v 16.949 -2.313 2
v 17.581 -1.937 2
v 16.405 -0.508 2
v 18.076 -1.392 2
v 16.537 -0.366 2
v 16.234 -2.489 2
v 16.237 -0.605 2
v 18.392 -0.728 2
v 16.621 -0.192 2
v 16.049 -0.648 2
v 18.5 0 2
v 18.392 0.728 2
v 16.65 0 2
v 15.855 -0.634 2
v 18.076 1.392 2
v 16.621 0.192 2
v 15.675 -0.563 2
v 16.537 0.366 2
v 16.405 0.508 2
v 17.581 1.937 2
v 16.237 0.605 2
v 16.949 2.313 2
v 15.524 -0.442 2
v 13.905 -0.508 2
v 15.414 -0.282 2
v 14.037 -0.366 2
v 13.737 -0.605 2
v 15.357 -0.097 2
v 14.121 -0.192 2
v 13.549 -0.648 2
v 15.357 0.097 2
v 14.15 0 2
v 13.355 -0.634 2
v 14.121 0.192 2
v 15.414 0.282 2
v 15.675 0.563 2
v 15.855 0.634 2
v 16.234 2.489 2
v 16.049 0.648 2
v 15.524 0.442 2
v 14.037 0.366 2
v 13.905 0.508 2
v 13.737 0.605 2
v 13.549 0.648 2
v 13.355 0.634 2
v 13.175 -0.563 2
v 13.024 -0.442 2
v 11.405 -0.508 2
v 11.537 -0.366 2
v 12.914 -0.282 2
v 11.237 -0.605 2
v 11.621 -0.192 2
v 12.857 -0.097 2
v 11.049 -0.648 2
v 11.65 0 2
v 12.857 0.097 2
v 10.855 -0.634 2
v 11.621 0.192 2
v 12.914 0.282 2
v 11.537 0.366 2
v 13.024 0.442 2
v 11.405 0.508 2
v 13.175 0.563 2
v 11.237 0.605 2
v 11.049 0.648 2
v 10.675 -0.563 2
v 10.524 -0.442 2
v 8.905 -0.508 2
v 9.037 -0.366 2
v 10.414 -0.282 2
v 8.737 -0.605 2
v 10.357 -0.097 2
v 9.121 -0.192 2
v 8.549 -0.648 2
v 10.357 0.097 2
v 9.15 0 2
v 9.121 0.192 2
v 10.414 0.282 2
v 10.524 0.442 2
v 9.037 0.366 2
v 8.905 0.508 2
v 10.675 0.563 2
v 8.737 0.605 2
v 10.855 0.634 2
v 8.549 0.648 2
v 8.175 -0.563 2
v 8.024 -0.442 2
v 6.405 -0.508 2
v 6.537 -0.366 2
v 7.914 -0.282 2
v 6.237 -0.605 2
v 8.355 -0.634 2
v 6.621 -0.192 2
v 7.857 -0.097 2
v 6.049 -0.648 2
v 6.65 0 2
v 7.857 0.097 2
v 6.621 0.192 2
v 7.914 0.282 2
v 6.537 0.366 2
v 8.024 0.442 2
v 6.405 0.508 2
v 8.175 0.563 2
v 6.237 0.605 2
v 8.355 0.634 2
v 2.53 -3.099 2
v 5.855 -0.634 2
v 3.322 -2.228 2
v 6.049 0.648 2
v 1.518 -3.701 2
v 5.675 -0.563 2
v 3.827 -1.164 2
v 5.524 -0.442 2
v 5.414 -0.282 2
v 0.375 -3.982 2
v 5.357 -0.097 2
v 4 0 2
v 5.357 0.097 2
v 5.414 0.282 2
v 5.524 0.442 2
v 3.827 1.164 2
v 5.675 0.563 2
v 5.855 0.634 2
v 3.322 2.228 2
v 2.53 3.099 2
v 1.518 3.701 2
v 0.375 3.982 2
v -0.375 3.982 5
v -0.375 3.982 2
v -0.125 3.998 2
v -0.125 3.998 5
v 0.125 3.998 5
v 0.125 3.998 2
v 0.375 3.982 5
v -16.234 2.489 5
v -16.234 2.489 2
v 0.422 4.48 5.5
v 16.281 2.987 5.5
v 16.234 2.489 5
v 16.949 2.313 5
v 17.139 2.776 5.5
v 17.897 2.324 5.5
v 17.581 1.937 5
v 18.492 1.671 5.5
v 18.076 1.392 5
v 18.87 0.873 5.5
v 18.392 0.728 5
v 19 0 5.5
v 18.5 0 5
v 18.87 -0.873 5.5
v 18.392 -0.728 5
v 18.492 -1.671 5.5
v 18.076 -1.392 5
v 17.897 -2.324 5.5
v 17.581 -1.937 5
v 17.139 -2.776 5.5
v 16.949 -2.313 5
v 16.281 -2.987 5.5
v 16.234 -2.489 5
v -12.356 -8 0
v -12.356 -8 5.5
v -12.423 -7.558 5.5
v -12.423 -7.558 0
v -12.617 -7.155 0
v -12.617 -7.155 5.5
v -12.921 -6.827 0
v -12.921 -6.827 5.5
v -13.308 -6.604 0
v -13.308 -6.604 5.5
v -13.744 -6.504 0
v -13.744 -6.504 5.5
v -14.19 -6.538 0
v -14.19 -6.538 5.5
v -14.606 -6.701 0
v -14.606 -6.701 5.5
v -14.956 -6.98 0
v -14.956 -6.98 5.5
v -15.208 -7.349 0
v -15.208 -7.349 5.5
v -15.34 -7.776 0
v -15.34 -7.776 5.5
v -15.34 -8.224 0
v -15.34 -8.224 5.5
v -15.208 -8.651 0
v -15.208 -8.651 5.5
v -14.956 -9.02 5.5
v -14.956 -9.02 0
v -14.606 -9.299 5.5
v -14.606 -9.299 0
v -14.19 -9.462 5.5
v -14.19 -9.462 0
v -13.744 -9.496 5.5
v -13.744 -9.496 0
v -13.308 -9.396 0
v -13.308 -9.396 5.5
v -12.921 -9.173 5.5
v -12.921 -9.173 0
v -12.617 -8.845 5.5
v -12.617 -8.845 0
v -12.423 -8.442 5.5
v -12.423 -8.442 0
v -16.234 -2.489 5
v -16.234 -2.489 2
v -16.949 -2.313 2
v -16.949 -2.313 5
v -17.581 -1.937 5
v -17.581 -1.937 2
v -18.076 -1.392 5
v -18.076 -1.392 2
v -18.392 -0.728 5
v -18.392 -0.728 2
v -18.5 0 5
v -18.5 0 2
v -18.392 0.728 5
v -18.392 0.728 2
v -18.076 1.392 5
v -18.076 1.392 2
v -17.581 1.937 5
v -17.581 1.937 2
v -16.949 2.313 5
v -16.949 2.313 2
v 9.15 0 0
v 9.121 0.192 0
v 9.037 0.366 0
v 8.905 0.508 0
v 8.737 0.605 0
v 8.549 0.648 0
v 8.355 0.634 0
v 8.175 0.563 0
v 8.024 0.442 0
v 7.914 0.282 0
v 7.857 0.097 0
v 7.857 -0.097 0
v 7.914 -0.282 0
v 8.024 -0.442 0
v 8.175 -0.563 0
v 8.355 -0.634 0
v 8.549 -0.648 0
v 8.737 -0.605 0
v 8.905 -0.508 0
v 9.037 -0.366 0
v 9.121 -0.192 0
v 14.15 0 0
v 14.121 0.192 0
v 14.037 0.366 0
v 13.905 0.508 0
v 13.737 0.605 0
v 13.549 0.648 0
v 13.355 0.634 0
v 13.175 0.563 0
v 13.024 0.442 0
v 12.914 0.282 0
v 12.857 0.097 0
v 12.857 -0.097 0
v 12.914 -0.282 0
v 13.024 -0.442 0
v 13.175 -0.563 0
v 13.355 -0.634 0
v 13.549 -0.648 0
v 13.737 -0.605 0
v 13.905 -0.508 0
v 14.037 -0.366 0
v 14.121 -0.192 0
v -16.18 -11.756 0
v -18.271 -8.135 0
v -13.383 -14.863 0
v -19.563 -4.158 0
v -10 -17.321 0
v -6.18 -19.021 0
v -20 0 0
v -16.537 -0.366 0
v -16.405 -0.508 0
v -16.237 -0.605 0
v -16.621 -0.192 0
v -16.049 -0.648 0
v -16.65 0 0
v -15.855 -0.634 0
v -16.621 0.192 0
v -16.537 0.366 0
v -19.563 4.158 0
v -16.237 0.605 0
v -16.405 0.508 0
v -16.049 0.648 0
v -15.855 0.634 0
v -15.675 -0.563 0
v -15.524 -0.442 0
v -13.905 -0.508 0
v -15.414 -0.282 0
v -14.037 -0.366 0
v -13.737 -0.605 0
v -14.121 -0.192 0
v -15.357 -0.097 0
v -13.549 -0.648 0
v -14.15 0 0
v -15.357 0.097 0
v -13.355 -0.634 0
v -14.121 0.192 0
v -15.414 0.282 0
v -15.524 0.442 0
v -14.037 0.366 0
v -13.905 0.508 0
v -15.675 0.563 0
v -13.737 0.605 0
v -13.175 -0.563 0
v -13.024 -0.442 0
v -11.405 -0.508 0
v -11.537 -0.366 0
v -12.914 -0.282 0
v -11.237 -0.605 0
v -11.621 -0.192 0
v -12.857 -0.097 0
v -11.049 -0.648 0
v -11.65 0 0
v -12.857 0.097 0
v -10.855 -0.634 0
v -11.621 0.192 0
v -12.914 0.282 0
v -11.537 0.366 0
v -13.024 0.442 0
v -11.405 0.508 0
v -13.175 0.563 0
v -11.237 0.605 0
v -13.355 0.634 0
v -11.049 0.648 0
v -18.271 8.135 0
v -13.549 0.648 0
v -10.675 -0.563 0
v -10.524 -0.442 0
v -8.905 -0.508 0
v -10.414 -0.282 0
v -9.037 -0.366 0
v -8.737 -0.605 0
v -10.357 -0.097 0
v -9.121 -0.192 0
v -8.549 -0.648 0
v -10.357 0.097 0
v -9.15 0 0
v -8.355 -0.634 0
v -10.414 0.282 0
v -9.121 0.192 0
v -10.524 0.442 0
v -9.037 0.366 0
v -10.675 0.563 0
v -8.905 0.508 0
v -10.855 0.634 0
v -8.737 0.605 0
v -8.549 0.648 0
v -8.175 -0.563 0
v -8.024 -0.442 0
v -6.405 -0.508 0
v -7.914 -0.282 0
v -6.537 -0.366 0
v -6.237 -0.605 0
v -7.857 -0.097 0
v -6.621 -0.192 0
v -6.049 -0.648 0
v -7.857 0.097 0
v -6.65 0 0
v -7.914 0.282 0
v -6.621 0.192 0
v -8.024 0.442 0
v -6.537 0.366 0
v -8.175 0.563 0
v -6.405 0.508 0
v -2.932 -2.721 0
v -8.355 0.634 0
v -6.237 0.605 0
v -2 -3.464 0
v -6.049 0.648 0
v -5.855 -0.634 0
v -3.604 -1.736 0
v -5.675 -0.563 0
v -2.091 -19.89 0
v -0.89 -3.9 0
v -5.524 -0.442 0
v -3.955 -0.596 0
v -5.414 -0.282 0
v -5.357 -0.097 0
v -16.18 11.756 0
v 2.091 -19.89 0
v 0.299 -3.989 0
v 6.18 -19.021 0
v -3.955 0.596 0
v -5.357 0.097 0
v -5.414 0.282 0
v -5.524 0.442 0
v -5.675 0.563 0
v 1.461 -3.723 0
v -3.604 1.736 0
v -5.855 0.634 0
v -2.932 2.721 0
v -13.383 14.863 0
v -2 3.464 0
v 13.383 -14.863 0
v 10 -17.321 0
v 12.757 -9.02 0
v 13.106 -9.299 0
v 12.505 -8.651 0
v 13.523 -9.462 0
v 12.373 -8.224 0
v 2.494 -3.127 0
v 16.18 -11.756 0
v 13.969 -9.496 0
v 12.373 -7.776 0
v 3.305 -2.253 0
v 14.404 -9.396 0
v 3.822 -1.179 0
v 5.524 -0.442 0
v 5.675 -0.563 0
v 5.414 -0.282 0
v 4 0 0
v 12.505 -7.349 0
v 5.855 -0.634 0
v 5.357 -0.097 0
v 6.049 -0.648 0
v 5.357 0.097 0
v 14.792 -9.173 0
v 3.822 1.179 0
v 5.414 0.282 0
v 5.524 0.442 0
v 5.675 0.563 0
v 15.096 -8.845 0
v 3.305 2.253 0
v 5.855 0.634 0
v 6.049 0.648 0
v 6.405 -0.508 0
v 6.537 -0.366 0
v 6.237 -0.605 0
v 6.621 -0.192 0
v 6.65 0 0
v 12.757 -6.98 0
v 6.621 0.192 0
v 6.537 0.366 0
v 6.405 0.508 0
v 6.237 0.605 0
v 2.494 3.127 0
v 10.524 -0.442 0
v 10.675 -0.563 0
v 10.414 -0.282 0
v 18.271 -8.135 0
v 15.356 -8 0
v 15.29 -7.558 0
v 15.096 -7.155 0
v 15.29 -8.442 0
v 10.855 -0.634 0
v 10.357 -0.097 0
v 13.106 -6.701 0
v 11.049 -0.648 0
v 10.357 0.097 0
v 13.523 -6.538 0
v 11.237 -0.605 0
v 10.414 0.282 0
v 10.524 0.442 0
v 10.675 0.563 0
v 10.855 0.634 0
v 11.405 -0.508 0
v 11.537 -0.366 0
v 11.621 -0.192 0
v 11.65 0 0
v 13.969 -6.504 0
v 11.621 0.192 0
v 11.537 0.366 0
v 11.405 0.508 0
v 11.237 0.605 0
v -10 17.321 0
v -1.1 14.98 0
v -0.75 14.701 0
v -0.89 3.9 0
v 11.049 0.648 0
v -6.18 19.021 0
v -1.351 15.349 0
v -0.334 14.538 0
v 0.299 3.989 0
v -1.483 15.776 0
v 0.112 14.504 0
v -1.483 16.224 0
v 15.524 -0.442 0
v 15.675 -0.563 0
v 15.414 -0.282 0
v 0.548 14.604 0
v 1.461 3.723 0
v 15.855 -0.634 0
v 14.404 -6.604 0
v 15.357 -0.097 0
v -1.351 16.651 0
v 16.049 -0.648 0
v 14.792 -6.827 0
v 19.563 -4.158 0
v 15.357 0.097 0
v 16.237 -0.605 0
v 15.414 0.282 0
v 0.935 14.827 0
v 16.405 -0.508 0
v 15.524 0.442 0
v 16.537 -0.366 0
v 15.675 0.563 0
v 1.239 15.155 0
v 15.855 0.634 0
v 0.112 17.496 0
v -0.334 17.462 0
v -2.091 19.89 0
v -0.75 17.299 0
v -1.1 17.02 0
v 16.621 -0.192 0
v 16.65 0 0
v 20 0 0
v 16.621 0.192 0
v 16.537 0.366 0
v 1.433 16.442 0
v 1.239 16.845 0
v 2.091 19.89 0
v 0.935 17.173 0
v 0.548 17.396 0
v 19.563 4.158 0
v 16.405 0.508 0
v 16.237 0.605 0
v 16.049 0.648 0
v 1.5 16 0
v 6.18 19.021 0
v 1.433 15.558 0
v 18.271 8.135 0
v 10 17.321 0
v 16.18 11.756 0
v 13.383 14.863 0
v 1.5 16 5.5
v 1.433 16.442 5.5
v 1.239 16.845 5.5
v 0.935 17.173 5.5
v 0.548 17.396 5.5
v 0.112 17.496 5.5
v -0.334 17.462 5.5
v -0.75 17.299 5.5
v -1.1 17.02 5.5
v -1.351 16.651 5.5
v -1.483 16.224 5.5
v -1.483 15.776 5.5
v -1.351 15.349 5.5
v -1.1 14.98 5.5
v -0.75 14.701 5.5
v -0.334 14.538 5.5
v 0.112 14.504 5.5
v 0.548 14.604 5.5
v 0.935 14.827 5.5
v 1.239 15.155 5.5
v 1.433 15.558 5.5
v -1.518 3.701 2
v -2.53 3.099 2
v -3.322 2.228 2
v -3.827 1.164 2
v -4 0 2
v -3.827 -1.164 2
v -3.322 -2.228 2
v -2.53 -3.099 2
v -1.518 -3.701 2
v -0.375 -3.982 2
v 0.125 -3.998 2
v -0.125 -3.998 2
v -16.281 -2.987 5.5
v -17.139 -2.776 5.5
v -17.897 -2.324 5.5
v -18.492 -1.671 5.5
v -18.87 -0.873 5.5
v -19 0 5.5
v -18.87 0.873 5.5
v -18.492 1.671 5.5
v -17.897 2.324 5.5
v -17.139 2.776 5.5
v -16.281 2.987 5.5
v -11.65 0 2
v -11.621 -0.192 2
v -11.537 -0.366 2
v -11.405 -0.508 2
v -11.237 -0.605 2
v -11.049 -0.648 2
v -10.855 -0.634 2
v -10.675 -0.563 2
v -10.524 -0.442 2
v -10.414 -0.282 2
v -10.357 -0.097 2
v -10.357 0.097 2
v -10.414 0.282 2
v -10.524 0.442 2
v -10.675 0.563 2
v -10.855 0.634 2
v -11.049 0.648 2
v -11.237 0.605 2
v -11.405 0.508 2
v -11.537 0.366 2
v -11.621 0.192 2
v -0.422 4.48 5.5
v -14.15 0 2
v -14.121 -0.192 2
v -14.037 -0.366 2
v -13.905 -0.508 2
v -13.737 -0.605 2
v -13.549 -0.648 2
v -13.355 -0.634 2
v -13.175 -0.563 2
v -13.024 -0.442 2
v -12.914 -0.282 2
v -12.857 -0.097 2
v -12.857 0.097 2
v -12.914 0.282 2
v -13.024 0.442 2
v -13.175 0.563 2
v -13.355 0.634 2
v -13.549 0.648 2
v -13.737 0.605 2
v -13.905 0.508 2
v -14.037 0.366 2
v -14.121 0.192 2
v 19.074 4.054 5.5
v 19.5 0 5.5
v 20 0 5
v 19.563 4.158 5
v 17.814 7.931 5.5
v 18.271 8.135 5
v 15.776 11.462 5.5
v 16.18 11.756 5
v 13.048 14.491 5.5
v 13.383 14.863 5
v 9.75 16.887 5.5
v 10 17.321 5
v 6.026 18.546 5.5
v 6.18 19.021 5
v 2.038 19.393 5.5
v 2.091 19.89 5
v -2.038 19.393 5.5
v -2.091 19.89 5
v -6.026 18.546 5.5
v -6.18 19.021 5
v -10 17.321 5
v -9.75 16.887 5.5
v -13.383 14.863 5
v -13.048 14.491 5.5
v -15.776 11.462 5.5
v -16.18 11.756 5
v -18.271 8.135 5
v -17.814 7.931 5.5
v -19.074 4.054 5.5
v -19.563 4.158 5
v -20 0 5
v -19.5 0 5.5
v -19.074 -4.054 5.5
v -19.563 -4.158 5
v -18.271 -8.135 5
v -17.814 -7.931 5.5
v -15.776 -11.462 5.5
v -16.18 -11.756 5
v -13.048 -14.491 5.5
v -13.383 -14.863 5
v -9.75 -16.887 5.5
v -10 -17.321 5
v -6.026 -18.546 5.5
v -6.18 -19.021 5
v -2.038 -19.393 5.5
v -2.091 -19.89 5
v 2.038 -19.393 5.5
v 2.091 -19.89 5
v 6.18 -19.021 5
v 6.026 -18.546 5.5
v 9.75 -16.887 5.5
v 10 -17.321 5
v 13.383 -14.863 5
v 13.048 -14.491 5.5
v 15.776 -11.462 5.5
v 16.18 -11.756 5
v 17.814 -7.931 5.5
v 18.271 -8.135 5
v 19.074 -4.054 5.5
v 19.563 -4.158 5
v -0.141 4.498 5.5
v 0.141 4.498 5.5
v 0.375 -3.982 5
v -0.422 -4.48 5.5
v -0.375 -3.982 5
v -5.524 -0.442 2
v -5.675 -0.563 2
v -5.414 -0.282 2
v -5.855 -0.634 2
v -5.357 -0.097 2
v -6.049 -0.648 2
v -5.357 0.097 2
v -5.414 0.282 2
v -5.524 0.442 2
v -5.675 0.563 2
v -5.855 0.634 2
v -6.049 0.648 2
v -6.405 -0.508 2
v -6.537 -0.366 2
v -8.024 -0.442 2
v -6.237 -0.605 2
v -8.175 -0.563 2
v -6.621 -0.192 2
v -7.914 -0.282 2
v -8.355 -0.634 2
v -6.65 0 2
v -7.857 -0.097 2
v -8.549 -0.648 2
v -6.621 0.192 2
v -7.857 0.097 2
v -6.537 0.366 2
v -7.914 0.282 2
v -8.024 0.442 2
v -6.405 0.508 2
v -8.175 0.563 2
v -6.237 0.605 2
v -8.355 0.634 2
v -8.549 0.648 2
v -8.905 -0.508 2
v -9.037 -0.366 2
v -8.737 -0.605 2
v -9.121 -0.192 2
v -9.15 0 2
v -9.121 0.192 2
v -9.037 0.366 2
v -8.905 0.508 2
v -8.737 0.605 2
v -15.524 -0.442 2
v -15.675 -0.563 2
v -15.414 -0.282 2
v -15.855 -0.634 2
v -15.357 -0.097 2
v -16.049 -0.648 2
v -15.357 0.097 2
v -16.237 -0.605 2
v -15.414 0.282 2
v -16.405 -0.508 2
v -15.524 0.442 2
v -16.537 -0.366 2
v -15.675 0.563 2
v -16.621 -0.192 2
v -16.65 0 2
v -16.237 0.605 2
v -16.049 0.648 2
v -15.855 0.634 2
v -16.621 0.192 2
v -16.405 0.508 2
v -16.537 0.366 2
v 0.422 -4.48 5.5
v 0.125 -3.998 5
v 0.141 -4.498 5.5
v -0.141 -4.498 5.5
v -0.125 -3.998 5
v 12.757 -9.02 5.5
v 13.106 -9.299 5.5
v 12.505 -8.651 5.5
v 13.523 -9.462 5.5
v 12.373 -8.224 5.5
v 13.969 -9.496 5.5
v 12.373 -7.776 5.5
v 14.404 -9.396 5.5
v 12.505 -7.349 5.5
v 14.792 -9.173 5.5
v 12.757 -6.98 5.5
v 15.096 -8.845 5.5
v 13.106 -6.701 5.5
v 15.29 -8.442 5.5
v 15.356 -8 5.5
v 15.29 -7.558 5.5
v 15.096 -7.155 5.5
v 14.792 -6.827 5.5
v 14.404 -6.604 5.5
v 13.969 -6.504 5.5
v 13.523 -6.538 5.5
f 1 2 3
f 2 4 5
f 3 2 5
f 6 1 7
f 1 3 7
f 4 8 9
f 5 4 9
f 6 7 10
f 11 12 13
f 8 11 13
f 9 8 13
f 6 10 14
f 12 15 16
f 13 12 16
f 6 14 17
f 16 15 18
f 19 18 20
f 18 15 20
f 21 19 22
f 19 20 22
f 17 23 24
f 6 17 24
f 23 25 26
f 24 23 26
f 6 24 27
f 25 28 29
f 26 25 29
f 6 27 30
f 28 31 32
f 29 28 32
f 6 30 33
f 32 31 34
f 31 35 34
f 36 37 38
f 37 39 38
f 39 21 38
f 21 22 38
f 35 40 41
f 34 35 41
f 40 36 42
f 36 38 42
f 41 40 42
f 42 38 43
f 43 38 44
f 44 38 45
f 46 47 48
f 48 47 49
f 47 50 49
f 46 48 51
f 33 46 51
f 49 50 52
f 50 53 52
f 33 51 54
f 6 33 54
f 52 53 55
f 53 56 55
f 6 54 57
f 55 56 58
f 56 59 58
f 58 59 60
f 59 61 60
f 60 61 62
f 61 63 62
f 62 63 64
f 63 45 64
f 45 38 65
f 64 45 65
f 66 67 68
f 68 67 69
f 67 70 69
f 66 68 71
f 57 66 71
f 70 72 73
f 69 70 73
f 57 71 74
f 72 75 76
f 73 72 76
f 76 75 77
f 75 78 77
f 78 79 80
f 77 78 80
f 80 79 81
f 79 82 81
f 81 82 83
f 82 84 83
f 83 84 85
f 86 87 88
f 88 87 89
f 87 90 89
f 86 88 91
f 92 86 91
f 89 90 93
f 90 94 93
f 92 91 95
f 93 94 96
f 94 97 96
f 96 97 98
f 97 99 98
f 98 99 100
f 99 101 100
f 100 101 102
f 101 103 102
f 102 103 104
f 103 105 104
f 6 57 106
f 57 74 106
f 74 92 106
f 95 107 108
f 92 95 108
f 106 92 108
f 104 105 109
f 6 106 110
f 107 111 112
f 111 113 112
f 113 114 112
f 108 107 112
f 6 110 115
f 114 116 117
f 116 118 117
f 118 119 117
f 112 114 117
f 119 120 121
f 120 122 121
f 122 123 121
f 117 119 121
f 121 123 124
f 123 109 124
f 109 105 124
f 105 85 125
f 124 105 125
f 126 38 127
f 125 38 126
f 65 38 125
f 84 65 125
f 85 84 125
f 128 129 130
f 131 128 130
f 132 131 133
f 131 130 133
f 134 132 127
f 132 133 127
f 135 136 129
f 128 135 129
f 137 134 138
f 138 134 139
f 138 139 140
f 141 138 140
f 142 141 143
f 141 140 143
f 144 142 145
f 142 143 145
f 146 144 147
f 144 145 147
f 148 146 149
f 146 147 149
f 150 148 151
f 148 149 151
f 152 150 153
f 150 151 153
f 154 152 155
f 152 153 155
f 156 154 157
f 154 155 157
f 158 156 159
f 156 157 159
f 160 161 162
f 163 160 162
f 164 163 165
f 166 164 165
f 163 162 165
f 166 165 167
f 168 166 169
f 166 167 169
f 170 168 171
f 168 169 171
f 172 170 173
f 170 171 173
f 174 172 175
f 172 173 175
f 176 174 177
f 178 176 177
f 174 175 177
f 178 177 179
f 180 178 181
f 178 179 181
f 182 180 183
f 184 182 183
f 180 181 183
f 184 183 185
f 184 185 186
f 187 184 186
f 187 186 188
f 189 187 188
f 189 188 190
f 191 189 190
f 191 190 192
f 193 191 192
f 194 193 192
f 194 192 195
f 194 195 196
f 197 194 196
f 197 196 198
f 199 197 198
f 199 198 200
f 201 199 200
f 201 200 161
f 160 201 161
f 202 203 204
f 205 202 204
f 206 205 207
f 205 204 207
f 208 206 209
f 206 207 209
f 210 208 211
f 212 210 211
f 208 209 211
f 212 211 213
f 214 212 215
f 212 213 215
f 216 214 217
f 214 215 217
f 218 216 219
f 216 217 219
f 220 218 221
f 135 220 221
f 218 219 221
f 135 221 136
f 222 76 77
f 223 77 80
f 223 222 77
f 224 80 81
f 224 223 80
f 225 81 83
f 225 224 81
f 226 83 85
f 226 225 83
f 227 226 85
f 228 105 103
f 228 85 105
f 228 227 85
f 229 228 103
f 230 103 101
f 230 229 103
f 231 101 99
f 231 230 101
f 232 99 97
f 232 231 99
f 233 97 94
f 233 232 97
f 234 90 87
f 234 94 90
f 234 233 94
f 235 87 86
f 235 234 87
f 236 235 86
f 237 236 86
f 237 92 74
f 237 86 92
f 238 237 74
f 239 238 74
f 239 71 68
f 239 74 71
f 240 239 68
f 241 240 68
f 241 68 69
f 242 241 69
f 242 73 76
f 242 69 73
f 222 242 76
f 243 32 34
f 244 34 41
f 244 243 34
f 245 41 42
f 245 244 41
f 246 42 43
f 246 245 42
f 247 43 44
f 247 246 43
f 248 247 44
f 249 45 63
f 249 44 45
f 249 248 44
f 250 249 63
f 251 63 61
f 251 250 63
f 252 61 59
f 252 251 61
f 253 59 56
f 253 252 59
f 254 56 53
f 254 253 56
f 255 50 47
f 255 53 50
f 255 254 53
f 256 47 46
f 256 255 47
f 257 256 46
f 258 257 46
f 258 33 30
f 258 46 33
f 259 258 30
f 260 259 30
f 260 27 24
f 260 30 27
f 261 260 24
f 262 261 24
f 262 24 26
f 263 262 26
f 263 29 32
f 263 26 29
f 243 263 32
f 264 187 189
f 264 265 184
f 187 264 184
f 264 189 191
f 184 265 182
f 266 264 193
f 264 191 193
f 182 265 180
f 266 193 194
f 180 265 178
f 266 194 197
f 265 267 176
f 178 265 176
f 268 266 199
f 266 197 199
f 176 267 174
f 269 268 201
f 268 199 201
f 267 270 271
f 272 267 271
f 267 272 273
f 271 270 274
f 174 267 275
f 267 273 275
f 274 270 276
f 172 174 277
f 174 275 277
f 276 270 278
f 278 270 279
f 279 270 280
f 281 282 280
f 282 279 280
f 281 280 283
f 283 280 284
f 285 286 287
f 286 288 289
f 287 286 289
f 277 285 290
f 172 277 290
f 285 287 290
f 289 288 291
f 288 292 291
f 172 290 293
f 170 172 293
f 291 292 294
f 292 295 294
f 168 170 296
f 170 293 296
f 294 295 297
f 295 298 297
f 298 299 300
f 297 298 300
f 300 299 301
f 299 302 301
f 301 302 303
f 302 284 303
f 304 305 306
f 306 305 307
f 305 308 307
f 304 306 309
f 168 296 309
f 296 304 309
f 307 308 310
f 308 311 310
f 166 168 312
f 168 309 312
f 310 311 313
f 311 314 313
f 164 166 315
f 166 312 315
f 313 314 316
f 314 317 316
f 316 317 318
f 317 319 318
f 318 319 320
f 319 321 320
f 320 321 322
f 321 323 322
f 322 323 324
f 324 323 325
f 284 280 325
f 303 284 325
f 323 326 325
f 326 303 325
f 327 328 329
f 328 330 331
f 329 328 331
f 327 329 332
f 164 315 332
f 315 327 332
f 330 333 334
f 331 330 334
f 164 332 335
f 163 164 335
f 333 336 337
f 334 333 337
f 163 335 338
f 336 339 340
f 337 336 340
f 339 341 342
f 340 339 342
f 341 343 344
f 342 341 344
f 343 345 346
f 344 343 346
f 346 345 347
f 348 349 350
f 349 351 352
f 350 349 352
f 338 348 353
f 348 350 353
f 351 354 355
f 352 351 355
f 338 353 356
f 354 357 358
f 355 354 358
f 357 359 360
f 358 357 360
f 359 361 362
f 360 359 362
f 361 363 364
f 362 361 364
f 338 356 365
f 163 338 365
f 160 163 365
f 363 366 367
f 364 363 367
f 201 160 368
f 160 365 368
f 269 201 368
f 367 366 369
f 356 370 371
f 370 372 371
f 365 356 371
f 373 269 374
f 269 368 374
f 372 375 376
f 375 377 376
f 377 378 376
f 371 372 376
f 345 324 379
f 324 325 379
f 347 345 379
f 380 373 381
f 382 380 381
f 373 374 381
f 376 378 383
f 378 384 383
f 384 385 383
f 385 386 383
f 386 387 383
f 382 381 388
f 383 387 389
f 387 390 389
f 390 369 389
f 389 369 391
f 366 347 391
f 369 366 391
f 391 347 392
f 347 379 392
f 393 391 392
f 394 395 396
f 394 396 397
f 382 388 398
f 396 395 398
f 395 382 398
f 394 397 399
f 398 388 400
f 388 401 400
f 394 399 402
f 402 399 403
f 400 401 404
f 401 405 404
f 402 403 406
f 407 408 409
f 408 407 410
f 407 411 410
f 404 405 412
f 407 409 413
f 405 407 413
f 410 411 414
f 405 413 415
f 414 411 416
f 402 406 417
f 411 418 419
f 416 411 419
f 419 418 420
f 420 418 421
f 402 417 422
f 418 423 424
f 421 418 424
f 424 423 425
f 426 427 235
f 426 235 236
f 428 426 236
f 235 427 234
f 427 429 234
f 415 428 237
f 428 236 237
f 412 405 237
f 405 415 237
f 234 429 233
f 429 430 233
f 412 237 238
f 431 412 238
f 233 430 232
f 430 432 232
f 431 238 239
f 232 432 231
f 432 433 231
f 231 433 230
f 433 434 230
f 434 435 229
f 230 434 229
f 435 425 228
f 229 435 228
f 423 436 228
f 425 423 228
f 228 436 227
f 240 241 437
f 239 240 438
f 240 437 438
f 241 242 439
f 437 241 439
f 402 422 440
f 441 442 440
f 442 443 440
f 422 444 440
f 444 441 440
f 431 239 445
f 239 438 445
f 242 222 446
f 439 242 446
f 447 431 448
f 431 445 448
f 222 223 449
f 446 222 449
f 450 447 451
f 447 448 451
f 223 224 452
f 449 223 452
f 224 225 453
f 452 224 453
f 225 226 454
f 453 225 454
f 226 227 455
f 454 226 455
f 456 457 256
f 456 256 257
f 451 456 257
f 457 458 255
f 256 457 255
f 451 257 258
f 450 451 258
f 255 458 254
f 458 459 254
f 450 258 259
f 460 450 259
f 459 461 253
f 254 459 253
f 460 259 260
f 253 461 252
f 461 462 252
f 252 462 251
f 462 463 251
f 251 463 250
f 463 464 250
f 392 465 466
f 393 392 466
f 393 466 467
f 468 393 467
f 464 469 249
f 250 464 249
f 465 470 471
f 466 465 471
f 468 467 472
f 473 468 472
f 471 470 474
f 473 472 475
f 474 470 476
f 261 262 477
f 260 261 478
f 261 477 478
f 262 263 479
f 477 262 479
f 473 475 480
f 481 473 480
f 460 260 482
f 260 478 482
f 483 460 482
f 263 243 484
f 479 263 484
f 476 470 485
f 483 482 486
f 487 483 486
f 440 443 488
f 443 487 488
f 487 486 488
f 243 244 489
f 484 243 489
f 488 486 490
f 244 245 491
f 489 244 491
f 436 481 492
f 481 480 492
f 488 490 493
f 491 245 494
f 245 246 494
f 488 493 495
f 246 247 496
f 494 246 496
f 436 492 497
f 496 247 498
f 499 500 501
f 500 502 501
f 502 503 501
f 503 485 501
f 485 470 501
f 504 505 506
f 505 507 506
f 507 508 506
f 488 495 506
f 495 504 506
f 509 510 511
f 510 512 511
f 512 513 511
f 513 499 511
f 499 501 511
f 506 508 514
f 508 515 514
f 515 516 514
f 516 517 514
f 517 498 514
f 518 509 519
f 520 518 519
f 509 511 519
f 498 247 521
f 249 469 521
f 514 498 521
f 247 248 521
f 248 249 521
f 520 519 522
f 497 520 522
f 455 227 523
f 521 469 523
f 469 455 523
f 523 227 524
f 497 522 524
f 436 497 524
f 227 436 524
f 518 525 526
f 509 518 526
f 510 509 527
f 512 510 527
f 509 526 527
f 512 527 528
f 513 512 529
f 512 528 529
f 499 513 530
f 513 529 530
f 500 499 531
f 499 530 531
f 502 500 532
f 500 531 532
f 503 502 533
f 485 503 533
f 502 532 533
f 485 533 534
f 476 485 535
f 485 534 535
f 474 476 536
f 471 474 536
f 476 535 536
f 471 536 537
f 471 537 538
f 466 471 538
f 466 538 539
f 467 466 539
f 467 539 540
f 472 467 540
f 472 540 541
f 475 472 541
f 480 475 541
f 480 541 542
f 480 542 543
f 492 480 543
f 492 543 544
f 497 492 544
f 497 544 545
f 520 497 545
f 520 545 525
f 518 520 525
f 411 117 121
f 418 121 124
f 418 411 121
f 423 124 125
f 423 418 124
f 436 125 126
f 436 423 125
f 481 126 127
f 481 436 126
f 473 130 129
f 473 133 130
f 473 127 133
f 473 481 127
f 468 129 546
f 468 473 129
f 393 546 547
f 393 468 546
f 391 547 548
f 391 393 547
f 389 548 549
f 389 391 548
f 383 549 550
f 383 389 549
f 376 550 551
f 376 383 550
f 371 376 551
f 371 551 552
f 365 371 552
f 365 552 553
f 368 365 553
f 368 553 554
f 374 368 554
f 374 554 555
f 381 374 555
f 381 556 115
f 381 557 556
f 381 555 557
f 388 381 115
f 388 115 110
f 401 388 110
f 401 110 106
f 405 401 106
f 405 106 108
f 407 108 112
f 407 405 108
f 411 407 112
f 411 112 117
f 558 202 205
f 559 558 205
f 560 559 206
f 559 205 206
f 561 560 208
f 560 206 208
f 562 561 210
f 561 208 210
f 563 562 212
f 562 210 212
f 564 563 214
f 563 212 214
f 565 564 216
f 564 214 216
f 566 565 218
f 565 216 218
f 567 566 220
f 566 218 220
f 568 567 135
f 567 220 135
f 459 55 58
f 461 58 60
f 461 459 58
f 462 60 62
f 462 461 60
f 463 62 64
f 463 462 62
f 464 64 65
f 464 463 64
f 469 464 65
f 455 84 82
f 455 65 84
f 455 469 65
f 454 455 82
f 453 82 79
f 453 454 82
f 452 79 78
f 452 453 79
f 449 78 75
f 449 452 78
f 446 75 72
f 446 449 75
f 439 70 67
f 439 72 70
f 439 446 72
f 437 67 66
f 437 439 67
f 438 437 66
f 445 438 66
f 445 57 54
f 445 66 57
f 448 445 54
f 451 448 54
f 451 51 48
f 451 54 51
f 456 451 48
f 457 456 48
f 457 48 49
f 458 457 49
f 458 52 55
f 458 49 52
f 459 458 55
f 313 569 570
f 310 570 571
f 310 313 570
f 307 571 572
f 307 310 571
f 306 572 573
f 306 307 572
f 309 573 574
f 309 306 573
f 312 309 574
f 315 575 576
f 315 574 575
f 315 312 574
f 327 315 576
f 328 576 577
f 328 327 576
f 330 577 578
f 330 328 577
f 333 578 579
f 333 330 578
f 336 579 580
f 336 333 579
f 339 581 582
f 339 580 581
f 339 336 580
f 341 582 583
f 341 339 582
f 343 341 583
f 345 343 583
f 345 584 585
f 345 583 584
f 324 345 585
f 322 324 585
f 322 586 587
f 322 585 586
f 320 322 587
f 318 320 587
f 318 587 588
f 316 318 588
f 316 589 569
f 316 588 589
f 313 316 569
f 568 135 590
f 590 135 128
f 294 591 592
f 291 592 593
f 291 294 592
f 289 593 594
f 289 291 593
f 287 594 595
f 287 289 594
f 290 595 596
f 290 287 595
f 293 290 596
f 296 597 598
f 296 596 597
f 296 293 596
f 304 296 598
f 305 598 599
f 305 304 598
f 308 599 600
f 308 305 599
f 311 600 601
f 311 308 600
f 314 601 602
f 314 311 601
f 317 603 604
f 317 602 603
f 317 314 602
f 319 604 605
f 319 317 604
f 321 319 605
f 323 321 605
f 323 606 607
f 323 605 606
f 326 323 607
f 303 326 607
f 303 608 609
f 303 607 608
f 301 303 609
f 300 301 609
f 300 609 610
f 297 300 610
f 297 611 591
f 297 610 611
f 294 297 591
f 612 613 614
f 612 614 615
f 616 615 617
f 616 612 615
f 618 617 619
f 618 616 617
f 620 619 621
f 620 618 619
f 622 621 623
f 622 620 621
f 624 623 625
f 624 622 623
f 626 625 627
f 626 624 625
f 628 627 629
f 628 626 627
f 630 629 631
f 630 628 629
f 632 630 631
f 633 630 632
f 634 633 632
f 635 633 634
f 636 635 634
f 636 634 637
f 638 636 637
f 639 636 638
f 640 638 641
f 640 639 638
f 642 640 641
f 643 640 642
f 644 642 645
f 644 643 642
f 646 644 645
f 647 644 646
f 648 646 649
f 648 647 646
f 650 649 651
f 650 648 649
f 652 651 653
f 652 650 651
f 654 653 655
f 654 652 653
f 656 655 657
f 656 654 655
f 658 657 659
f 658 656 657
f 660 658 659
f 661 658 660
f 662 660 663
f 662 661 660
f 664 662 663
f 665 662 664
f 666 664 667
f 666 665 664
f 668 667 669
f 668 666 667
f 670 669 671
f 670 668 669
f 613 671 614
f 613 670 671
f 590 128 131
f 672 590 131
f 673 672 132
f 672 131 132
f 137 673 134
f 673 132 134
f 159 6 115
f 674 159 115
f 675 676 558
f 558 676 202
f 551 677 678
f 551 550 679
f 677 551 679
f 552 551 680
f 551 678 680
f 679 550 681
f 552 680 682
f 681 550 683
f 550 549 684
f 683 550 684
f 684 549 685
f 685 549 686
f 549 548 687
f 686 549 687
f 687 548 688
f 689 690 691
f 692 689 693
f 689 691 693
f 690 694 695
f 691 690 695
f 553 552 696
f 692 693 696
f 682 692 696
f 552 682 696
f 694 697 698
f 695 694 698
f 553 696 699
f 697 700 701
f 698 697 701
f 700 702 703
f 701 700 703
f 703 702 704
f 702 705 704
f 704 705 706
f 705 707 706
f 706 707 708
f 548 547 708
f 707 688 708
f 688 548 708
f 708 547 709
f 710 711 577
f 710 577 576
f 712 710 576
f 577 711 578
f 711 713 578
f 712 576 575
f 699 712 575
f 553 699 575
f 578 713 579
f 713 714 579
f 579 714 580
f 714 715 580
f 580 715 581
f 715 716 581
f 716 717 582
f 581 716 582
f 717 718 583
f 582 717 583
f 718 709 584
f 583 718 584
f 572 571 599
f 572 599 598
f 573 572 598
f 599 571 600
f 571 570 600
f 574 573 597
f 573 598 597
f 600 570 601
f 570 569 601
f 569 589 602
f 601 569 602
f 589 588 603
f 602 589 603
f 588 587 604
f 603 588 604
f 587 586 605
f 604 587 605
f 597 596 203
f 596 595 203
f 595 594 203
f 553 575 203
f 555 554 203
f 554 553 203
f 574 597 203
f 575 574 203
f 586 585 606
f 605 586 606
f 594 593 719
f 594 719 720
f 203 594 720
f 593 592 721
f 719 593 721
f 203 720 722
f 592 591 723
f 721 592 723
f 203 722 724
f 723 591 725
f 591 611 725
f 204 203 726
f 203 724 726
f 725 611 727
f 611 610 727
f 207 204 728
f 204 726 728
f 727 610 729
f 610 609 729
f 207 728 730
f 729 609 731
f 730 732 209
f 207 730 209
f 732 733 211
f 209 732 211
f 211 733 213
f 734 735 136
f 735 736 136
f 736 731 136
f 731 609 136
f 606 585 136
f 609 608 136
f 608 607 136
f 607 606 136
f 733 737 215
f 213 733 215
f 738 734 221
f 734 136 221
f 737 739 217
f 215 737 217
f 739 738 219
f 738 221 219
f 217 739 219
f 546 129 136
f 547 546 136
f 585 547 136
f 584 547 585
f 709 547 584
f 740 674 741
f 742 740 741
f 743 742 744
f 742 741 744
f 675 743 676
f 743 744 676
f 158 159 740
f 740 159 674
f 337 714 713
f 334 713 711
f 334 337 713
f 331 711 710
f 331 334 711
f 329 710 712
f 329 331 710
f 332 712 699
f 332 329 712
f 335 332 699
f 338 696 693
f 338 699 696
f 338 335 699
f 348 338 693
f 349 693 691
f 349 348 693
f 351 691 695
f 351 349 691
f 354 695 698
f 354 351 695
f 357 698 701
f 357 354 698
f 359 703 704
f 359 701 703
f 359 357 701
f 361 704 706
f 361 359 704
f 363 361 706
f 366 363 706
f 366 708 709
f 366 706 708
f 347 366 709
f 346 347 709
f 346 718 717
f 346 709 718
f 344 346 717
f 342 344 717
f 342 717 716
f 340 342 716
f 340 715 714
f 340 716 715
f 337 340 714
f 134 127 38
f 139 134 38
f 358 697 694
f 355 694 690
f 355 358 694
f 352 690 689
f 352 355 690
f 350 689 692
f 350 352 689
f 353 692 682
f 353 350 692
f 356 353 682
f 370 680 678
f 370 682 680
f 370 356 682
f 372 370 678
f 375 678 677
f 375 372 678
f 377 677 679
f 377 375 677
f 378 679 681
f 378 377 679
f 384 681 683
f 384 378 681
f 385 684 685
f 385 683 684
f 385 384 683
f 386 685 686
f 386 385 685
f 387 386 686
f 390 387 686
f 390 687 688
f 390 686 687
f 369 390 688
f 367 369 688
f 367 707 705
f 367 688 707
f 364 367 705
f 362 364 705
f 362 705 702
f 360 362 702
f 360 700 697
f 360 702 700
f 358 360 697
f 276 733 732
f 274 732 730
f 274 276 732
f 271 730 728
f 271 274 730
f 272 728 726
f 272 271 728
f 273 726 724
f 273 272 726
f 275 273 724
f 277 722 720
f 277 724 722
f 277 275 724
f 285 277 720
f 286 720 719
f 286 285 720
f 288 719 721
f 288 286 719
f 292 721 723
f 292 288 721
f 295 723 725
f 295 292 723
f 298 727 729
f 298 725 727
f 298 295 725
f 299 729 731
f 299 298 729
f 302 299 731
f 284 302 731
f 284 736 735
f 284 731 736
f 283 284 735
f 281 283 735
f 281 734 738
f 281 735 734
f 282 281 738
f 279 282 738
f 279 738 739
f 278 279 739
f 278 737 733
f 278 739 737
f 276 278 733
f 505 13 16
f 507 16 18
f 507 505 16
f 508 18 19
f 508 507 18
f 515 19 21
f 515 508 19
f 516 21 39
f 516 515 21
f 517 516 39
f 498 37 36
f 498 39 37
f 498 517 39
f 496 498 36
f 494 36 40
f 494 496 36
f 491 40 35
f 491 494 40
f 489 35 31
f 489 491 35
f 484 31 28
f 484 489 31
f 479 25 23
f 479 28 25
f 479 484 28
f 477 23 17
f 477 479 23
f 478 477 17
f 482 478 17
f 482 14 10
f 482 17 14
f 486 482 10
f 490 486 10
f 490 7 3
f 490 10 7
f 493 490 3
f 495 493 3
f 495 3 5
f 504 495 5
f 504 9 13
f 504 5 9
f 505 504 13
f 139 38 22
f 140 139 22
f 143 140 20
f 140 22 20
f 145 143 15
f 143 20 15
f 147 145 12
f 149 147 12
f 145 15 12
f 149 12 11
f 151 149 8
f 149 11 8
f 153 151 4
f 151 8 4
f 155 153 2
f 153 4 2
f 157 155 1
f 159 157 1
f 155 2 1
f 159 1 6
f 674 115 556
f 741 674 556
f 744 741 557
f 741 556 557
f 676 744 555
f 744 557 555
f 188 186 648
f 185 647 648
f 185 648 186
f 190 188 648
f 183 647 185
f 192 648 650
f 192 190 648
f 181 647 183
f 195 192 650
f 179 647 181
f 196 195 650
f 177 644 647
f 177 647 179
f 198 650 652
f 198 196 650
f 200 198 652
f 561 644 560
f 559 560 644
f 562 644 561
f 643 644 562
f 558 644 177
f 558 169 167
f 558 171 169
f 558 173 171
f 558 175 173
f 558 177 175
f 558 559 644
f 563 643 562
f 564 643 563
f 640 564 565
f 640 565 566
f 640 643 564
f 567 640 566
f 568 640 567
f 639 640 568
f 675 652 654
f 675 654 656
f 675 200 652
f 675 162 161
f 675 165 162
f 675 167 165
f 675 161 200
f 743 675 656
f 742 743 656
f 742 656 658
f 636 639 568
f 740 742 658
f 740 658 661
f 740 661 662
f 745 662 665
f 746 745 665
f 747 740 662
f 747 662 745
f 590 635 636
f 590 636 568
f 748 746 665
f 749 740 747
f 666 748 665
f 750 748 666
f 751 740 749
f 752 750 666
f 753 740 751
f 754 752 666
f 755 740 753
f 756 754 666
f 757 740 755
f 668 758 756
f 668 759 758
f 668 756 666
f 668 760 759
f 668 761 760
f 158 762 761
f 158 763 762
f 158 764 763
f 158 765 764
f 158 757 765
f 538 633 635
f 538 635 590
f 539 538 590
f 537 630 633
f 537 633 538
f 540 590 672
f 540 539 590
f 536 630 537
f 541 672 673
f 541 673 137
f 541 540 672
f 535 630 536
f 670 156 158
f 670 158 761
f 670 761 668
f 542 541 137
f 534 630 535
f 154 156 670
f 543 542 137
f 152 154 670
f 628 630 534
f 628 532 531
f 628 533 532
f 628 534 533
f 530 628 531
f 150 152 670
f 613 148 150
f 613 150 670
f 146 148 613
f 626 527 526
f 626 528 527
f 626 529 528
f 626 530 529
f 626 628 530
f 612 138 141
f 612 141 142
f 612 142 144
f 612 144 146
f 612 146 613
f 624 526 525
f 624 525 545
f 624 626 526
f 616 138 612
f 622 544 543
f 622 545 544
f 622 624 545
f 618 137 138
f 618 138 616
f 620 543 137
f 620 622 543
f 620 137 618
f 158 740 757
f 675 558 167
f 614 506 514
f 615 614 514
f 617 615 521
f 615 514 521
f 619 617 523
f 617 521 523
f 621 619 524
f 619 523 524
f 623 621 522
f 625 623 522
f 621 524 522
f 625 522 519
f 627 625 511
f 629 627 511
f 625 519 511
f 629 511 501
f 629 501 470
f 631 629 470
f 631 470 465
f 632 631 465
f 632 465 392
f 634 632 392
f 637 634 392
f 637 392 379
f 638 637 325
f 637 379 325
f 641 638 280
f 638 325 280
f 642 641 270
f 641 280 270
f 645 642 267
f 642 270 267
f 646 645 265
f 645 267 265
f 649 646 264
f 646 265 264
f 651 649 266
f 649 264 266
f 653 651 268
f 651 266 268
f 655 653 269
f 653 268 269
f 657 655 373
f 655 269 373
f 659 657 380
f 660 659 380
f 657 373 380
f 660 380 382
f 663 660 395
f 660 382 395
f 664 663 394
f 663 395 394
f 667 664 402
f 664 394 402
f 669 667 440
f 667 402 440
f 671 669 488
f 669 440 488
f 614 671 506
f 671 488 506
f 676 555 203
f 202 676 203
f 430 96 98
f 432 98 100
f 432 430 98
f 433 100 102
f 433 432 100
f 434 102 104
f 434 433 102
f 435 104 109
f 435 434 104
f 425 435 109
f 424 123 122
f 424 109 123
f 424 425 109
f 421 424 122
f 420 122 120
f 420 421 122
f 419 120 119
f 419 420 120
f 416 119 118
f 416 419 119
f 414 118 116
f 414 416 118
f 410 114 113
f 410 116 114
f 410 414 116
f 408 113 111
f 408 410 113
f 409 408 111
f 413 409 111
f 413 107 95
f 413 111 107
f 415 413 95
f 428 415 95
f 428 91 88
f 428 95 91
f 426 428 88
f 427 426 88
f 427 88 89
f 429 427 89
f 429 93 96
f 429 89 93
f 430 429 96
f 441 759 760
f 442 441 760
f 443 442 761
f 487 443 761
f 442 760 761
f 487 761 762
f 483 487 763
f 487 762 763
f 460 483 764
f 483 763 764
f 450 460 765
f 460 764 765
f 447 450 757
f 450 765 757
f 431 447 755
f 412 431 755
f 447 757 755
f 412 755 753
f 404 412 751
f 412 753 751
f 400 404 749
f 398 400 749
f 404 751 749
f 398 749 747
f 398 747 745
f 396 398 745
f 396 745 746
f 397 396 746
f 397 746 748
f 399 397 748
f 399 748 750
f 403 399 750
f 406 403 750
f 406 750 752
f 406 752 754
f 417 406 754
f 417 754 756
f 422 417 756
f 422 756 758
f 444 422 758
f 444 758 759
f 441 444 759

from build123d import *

# Parameters (mm, degrees)
SKETCH_1_R          = 20
SKETCH_1_R_2        = 4
SKETCH_1_R_3        = 0.65
EXTRUDE_1_DEPTH     = 5.5
CUT_EXTRUDE_START   = -3.5
CUT_EXTRUDE_1_DEPTH = 3.5
SKETCH_3_R          = 1.5
CUT_EXTRUDE_2_DEPTH = 13
CHAMFER_1_SIZE      = 0.5
CHAMFER_2_SIZE      = 0.5


with BuildPart() as part:
    # 草图1 → 凸台-拉伸1 (new body)
    with BuildSketch(Plane.XY):
        Circle(SKETCH_1_R)
        Circle(SKETCH_1_R_2, mode=Mode.SUBTRACT)
        with Locations((6, 0)):
            Circle(SKETCH_1_R_3, mode=Mode.SUBTRACT)
        with Locations((8.5, 0)):
            Circle(SKETCH_1_R_3, mode=Mode.SUBTRACT)
        with Locations((11, 0)):
            Circle(SKETCH_1_R_3, mode=Mode.SUBTRACT)
        with Locations((13.5, 0)):
            Circle(SKETCH_1_R_3, mode=Mode.SUBTRACT)
        with Locations((16, 0)):
            Circle(SKETCH_1_R_3, mode=Mode.SUBTRACT)
        with Locations(Location((-16, 0, 0), (0, 0, 180))):
            Circle(SKETCH_1_R_3, mode=Mode.SUBTRACT)
        with Locations(Location((-13.5, 0, 0), (0, 0, 180))):
            Circle(SKETCH_1_R_3, mode=Mode.SUBTRACT)
        with Locations(Location((-11, 0, 0), (0, 0, 180))):
            Circle(SKETCH_1_R_3, mode=Mode.SUBTRACT)
        with Locations(Location((-8.5, 0, 0), (0, 0, 180))):
            Circle(SKETCH_1_R_3, mode=Mode.SUBTRACT)
        with Locations(Location((-6, 0, 0), (0, 0, 180))):
            Circle(SKETCH_1_R_3, mode=Mode.SUBTRACT)
    extrude(amount=EXTRUDE_1_DEPTH)

    # 草图2 → 切除-拉伸1 (cut)
    with BuildSketch(Plane.XY.offset(5.5).offset(CUT_EXTRUDE_START)):
        with BuildLine():
            Line((-16.234375, 2.488989425), (-0.375, 3.982383081))
            ThreePointArc((-0.375, 3.982383081), (0, 4), (0.375, 3.982383081))
            Line((0.375, 3.982383081), (16.234375, 2.488989425))
            ThreePointArc((16.234375, 2.488989425), (18.5, 0), (16.234375, -2.488989425))
            Line((16.234375, -2.488989425), (0.375, -3.982383081))
            ThreePointArc((0.375, -3.982383081), (0, -4), (-0.375, -3.982383081))
            Line((-0.375, -3.982383081), (-16.234375, -2.488989425))
            ThreePointArc((-16.234375, -2.488989425), (-18.5, 0), (-16.234375, 2.488989425))
        make_face()
    extrude(amount=CUT_EXTRUDE_1_DEPTH, mode=Mode.SUBTRACT)

    # 草图3 → 切除-拉伸2 (cut)
    with BuildSketch(Plane.XY.offset(5.5)):
        with Locations((0, 16)):
            Circle(SKETCH_3_R)
        with Locations((13.856406461, -8)):
            Circle(SKETCH_3_R)
        with Locations((-13.856406461, -8)):
            Circle(SKETCH_3_R)
    extrude(amount=-CUT_EXTRUDE_2_DEPTH, mode=Mode.SUBTRACT)

    # 倒角1
    chamfer_1_edges = [part.edges().sort_by_distance(p)[0] for p in [
        (-20, 0, 5.5),
    ]]
    chamfer(chamfer_1_edges, length=CHAMFER_1_SIZE)

    # 倒角2
    chamfer_2_edges = [part.edges().sort_by_distance(p)[0] for p in [
        (0, 4, 5.5),
        (0, -4, 5.5),
        (-8.3046875, 3.235686253, 5.5),
        (-18.5, 0, 5.5),
        (-8.3046875, -3.235686253, 5.5),
        (8.3046875, -3.235686253, 5.5),
        (18.5, 0, 5.5),
        (8.3046875, 3.235686253, 5.5),
    ]]
    chamfer(chamfer_2_edges, length=CHAMFER_2_SIZE)


solid = part.part
